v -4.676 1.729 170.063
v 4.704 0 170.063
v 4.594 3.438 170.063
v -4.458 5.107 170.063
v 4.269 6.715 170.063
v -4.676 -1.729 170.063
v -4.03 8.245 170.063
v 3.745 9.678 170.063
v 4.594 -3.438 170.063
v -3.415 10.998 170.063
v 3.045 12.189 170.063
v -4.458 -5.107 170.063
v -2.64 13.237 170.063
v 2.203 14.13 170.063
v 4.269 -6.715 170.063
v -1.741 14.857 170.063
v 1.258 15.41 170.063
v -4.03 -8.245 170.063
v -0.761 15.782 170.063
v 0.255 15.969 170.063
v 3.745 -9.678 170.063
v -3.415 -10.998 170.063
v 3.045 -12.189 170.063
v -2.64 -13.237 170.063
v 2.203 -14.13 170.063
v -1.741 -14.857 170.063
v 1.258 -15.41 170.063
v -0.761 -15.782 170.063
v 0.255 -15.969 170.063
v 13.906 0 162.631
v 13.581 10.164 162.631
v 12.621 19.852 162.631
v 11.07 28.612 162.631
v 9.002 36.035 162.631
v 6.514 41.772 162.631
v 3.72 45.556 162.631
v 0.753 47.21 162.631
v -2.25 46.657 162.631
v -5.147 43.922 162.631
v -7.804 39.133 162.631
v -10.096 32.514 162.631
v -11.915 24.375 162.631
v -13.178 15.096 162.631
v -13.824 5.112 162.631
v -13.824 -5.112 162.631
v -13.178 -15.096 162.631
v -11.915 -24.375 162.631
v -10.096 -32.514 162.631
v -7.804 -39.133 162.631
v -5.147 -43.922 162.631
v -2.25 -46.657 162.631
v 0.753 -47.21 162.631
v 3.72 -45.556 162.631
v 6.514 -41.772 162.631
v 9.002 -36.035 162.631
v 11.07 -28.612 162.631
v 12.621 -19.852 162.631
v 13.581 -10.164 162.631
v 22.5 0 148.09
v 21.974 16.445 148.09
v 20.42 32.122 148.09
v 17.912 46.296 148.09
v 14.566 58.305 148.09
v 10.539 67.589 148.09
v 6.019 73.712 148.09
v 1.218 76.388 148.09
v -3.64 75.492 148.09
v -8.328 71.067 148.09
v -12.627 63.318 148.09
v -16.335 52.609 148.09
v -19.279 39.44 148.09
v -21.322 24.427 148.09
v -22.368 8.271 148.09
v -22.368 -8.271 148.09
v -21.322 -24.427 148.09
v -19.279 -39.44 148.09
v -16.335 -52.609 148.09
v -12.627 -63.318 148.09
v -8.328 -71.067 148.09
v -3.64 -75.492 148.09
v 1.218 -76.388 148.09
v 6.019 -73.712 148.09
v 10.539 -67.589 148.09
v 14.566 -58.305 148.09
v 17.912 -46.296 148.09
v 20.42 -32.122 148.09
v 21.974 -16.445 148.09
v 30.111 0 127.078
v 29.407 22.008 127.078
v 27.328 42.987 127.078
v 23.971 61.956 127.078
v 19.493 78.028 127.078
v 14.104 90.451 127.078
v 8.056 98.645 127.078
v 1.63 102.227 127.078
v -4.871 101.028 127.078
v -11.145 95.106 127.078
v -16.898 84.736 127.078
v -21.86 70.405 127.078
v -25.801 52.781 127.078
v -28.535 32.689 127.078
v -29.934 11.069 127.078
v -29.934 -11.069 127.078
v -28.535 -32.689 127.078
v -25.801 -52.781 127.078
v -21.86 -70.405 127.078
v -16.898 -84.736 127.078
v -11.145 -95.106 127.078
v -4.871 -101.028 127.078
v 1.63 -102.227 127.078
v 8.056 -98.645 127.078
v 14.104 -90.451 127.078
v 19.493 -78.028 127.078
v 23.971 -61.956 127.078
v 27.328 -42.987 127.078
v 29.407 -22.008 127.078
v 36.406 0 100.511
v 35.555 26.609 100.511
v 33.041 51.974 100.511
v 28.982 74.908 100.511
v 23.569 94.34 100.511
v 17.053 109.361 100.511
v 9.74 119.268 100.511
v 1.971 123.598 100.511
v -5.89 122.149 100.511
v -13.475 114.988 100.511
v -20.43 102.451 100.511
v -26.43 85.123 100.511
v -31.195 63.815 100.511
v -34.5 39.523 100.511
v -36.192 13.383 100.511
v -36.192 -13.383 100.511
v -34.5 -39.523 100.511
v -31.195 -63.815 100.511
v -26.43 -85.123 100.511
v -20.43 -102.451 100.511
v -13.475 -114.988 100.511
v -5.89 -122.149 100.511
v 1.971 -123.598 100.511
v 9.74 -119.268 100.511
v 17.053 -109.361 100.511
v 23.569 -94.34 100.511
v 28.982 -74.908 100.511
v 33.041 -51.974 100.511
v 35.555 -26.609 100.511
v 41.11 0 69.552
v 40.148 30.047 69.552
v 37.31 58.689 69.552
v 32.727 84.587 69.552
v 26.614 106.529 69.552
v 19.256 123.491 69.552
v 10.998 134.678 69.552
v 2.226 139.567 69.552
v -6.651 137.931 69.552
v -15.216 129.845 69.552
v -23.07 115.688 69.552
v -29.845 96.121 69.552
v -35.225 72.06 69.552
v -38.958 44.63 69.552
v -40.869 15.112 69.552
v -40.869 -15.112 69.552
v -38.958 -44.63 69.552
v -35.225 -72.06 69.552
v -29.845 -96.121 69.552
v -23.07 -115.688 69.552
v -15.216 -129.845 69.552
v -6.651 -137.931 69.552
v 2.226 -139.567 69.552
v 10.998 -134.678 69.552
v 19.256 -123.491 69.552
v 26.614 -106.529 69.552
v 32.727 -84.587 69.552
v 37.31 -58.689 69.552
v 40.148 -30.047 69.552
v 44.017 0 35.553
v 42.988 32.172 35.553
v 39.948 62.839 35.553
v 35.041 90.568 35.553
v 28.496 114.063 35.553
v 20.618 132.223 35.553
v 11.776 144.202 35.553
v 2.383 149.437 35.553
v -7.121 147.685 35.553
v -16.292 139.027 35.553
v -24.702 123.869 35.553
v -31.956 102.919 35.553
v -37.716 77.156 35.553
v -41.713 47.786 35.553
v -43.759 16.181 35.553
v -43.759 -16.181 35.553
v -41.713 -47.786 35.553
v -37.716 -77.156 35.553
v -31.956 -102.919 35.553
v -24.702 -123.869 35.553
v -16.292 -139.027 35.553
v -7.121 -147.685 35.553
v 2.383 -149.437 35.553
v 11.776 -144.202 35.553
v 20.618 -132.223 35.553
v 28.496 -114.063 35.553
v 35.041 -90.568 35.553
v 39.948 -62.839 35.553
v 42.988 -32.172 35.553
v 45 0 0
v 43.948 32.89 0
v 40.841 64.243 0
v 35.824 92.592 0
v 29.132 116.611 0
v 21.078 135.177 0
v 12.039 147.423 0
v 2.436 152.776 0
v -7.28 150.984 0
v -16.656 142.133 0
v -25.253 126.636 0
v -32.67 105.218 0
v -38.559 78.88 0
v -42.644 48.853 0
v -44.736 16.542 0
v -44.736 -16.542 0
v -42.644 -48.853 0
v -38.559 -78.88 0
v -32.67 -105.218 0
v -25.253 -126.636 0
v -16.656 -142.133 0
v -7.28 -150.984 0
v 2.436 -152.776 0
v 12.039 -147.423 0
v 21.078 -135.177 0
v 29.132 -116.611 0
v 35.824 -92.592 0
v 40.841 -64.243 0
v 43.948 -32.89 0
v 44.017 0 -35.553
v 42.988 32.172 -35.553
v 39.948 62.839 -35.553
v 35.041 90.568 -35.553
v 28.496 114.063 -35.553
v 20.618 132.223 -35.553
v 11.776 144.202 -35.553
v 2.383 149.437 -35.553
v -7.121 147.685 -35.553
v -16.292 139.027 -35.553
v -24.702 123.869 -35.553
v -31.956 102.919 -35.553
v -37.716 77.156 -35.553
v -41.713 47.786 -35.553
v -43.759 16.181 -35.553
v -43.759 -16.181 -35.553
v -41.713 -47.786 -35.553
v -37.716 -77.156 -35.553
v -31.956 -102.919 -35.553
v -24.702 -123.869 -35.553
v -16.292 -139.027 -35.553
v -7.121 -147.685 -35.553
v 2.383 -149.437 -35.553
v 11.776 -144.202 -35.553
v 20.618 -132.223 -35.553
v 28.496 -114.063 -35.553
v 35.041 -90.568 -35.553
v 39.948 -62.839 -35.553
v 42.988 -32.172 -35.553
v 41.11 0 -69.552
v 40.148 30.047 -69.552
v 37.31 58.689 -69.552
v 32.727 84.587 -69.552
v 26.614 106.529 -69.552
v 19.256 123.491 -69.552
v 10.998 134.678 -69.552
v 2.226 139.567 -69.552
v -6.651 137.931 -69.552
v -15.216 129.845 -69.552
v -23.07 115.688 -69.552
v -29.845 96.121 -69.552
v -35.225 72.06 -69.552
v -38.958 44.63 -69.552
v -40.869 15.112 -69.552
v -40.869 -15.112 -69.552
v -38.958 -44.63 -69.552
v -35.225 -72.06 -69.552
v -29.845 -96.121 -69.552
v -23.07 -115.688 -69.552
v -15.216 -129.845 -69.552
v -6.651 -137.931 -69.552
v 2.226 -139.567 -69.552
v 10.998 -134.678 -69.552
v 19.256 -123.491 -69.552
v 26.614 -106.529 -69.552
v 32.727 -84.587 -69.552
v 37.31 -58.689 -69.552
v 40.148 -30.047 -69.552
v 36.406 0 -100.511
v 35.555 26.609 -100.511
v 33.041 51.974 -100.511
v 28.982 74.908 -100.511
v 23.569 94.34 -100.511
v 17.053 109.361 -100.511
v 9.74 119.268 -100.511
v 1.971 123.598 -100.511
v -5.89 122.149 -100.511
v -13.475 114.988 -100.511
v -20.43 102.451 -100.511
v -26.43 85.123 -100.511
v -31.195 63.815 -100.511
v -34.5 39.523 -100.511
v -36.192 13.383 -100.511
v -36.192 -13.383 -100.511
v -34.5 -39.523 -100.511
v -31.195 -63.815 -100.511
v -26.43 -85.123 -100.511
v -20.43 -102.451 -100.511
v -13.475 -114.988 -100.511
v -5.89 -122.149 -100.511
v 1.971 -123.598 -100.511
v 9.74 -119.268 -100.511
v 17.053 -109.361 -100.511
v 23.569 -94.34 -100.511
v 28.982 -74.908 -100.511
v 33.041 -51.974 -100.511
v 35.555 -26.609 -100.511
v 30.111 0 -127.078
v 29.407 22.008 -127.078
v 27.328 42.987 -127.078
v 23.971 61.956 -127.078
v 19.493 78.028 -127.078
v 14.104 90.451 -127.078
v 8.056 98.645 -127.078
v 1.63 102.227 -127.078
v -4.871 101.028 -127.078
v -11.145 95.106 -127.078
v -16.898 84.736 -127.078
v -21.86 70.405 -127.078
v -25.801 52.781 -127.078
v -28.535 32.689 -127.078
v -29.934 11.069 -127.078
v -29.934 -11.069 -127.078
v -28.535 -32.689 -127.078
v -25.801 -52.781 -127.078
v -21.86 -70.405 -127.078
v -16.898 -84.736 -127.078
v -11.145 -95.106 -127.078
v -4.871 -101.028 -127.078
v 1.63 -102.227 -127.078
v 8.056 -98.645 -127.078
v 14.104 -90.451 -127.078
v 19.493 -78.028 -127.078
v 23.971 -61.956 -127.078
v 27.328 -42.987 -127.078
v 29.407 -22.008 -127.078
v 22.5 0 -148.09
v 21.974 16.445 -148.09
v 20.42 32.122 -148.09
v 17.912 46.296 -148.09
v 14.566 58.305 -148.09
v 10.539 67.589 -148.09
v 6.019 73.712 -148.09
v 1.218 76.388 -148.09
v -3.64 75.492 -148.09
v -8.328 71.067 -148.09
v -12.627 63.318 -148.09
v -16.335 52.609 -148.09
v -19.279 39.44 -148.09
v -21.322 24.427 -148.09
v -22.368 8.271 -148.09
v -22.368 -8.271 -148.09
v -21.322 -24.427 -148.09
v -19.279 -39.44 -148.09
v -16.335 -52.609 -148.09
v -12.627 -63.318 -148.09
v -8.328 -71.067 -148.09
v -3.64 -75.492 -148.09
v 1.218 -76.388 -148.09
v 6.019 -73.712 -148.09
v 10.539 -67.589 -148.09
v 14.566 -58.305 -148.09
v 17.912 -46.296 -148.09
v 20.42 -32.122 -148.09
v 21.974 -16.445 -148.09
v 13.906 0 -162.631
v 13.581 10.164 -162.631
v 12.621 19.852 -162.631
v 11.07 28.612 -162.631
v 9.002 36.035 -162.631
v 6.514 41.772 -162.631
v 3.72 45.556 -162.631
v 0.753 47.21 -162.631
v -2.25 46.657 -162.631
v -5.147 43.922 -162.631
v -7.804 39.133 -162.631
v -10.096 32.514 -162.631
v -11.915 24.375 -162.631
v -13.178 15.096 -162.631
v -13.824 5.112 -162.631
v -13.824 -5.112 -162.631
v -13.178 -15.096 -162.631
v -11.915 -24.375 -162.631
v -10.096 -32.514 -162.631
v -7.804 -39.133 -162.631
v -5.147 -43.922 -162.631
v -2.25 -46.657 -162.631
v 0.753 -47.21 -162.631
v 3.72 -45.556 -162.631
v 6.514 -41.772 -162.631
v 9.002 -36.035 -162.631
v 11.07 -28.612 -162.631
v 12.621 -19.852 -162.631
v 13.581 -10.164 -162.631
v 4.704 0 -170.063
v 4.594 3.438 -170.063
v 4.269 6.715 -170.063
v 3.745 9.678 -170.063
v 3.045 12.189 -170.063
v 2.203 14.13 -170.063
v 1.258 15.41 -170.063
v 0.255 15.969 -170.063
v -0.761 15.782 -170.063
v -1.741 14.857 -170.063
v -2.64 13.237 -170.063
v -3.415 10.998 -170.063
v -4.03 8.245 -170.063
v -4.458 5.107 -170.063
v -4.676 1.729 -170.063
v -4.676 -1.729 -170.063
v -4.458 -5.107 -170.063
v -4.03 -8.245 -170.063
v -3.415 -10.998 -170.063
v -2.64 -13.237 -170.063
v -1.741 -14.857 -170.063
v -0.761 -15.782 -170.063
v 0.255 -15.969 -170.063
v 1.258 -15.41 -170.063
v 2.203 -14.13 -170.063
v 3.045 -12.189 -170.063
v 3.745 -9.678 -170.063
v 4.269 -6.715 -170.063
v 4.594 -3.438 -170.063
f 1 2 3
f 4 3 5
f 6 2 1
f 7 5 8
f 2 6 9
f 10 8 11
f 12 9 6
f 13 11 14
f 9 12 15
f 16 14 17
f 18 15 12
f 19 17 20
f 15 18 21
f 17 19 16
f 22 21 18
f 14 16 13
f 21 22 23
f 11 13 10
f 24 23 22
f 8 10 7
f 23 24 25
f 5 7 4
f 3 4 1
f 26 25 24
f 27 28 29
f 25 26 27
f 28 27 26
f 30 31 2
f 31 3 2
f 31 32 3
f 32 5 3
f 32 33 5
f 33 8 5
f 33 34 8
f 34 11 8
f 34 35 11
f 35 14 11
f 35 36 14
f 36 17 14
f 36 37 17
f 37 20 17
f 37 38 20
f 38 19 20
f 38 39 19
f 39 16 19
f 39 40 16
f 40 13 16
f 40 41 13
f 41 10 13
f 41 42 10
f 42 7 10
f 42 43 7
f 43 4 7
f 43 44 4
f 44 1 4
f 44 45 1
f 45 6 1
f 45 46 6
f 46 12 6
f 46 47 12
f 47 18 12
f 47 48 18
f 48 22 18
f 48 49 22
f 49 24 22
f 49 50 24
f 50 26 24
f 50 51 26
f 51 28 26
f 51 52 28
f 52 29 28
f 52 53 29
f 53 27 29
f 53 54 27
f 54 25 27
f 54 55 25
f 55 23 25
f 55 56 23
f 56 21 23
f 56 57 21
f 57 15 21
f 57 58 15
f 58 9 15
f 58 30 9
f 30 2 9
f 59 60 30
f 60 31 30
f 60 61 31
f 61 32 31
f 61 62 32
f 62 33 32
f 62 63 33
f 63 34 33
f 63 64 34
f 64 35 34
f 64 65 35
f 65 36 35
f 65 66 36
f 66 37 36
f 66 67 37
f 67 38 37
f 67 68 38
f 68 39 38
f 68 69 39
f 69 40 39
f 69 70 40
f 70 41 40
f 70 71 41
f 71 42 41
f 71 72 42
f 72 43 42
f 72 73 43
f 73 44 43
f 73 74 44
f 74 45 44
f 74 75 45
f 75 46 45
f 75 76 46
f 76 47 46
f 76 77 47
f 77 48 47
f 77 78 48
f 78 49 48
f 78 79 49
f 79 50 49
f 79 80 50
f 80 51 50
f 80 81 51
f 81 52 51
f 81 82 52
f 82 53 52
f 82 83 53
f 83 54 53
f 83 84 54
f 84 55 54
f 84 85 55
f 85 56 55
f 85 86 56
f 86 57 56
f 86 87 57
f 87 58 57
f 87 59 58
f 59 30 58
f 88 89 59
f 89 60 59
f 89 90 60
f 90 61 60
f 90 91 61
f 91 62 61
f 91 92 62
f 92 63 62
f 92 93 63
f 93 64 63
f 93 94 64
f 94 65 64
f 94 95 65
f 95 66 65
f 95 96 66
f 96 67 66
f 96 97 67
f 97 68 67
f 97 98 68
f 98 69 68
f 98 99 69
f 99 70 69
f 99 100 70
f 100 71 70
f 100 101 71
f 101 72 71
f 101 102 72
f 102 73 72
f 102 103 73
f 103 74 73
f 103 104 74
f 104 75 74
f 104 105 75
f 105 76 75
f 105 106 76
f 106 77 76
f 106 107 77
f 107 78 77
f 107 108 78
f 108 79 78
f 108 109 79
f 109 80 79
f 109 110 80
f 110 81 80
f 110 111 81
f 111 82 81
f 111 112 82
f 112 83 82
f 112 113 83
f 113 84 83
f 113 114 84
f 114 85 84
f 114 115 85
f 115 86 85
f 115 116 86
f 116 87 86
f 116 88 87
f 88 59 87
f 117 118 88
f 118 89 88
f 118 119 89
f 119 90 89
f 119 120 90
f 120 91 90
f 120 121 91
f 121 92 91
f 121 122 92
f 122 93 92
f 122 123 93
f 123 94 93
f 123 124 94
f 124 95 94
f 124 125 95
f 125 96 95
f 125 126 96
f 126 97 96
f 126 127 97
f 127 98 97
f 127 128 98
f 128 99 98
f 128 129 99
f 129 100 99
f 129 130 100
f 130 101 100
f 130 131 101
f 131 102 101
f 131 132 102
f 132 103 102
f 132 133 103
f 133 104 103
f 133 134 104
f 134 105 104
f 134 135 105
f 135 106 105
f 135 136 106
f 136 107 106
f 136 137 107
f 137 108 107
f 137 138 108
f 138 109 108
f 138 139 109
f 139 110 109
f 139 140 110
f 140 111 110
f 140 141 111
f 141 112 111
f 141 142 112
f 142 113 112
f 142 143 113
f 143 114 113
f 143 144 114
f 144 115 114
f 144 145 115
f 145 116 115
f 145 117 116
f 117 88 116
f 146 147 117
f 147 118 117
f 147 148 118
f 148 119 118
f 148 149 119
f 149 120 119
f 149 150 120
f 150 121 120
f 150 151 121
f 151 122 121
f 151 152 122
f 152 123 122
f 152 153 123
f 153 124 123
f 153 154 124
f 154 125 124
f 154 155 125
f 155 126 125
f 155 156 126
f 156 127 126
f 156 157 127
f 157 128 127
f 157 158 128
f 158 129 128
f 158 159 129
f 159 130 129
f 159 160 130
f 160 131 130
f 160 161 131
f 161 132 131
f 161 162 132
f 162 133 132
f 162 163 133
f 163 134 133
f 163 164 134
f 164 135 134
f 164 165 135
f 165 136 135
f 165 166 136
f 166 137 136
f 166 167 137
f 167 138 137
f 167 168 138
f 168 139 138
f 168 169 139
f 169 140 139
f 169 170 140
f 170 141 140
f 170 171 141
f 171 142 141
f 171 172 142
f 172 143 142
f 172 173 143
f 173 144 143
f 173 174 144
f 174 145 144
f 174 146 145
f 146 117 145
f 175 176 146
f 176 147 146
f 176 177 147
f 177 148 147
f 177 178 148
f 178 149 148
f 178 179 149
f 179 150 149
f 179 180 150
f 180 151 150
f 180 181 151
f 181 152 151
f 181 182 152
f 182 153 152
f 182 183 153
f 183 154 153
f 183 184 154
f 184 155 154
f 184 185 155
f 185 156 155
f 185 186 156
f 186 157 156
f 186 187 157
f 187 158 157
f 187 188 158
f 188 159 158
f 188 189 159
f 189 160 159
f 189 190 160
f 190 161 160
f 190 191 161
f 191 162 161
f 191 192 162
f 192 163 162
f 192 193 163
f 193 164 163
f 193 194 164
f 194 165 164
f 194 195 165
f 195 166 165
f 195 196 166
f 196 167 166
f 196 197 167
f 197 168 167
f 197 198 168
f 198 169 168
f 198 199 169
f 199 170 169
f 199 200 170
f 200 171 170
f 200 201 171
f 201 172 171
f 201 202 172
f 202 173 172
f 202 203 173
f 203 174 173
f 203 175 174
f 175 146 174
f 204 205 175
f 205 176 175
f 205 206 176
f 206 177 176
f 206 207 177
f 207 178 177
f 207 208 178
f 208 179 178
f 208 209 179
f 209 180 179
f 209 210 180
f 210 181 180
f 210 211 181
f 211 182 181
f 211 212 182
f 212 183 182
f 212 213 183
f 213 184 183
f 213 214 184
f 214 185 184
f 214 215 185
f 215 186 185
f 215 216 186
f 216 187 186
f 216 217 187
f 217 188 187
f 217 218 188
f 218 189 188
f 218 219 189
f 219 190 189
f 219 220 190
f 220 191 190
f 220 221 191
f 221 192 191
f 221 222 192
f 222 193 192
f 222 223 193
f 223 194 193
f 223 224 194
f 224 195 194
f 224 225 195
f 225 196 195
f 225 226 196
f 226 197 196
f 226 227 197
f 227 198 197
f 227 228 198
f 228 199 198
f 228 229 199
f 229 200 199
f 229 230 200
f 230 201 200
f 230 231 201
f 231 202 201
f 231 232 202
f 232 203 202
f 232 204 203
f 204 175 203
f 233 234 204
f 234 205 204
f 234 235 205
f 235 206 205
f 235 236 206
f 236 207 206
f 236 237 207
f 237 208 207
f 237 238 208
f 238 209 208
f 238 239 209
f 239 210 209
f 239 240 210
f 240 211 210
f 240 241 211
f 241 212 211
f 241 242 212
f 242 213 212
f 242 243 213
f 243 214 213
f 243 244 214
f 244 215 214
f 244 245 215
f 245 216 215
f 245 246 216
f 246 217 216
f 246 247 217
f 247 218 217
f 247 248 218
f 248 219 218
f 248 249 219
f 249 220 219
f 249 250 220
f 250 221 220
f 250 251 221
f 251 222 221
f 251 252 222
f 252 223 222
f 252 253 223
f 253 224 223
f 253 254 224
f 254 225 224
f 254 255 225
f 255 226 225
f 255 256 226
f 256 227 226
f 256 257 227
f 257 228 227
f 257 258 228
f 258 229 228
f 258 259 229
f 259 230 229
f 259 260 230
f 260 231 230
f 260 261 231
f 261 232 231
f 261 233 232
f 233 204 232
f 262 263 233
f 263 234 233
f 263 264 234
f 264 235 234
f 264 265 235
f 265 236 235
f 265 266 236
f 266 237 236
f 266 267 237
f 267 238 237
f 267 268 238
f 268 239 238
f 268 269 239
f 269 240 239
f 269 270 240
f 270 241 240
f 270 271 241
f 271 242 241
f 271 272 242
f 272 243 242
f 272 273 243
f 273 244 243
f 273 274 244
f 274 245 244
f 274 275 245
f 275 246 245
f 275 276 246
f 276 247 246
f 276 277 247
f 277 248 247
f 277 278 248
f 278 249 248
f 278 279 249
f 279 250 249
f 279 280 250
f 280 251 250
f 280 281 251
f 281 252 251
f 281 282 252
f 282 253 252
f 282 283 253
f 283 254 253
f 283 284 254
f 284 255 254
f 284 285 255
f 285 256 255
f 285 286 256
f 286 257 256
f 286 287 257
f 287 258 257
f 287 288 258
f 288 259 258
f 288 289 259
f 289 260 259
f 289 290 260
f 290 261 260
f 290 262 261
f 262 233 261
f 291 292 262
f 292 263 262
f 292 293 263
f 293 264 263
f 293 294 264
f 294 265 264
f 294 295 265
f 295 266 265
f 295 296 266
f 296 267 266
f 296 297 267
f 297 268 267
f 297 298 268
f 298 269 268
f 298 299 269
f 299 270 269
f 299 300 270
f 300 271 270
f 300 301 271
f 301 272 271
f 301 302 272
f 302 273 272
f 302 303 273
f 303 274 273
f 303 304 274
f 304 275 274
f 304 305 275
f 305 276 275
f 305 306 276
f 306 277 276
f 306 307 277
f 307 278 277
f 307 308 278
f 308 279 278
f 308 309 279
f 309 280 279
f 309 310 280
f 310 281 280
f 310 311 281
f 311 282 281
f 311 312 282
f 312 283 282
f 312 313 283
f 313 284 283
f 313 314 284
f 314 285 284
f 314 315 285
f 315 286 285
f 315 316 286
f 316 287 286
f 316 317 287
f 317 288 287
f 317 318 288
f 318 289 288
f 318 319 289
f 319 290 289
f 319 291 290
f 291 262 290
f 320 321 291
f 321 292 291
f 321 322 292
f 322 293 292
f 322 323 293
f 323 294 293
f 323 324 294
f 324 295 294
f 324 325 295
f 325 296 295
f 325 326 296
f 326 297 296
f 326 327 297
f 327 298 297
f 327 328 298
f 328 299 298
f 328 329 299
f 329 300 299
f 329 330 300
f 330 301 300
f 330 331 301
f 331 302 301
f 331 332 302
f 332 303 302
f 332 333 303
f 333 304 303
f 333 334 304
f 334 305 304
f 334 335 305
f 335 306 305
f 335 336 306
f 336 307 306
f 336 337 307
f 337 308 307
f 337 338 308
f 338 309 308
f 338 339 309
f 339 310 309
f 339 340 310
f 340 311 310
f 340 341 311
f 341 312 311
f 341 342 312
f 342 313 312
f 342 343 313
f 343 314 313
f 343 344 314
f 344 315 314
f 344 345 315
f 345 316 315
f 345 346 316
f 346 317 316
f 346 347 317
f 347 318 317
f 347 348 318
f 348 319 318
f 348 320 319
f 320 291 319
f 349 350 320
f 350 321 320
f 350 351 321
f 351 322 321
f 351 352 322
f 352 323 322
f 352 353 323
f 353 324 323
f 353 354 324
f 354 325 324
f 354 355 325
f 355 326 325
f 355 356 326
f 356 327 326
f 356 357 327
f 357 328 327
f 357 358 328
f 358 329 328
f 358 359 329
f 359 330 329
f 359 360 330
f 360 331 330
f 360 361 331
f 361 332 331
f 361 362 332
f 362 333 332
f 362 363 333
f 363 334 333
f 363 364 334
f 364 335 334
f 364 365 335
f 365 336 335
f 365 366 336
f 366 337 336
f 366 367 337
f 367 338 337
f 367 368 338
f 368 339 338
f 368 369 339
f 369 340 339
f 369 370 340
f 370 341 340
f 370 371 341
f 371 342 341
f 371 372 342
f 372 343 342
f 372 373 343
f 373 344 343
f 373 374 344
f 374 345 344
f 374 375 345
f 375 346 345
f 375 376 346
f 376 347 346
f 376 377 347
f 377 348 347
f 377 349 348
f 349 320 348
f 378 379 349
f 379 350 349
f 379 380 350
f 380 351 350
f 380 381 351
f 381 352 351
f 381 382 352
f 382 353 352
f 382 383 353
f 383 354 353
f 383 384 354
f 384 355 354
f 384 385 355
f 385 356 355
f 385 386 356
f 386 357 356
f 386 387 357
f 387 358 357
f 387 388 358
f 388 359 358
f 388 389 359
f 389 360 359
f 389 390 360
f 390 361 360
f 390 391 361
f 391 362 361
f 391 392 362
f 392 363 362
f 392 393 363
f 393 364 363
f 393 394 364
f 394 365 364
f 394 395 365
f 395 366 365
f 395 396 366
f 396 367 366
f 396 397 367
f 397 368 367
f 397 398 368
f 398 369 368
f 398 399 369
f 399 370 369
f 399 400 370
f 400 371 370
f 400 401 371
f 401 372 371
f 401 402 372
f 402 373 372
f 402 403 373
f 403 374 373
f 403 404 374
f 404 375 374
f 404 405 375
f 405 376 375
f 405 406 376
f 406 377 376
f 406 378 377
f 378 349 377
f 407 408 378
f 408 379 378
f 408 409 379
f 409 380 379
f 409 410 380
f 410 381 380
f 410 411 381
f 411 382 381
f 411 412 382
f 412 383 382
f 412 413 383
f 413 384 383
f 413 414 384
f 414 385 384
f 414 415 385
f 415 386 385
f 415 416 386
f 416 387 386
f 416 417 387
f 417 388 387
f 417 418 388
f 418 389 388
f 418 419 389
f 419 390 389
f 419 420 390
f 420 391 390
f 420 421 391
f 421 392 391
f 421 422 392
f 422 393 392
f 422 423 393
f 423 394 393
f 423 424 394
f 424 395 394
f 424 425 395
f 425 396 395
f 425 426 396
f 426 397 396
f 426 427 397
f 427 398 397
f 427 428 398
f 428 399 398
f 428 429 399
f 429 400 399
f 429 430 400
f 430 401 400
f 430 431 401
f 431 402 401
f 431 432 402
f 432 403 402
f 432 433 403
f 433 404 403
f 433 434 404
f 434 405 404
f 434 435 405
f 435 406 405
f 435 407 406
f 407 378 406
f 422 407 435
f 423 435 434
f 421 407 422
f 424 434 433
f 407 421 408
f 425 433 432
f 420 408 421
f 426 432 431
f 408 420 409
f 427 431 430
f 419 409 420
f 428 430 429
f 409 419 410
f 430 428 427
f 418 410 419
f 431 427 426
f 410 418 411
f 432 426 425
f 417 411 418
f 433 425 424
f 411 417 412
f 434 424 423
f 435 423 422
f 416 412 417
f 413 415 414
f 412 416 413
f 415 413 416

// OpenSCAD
// Generated by SolidPython 1.0.1 on 2020-07-29 00:46:47


scale(v = [5, 17, 19]) {
	sphere(r = 9);
}
/***********************************************
*********      SolidPython code:      **********
************************************************
 
# import packages: SolidPython
from solid import *
from solid.utils import *
from itertools import chain, combinations, permutations


class Resize:

    def __init__(self, scad_file):
        self.scad_file = scad_file
        #self.scad_file = import_scad(scad_file)
        # cone/cylinder param:
        self.r1 = 0
        self.r2 = 0
        self.h = 0
        # rectangular prism param:
        self.w = 0
        self.l = 0
        # ellipse param:
        self.r = 0

    # import OpenScad code (file name corresponds to shape)


    # classify shape + parameters
    def assign(self, param1, param2, param3):
        if self.scad_file == 'cone.scad':
            self.r1 = param1
            self.r2 = param2
            self.h = param3
        elif self.scad_file == 'cylinder.scad':
            self.r1 = param1
            self.r2 = param2
            self.h = param3
        elif self.scad_file == 'rectangularPrism.scad':
            self.h = param1
            self.l = param2
            self.w = param3
        else:
            self.r = param1
            self.h = param2

    # resize parameters
    def iterate(self):
        x = range(3, 20, 2)
        i = 1
        if self.scad_file == 'cone.scad':
            tempList = list(permutations(x, 2))
            for temp in tempList:
                param1 = temp[0]
                param2 = temp[1]
                filepath = 'produced_scad_files/' + 'cone' + str(param1) + '_' + str(param2) + '_' + '.scad'
                scad_render_to_file(cylinder(h=param1, r1=param2, r2=0), filepath)

        elif self.scad_file == 'cylinder.scad':
            tempList = list(permutations(x, 3))
            for temp in tempList:
                param1 = temp[0]
                param2 = temp[1]
                filepath = 'produced_scad_files/' + 'cylinder' + str(param1) + '_' + str(param2) + '_' + '.scad'
                scad_render_to_file(cylinder(h=param1, r1=param2, r2=param2), filepath)

        elif self.scad_file == 'rectangularPrism.scad':
            tempList = list(permutations(x, 3))
            for temp in tempList:
                param1 = temp[0]
                param2 = temp[1]
                param3 = temp[2]
                filepath = 'produced_scad_files/' + 'rectangularPrism' + str(param1) + '_' + str(param2) + '_' + str(
                    param3) + '.scad'
                scad_render_to_file(cube(size=(param1, param2, param3)), filepath)

        elif self.scad_file == 'ellipse.scad':
            tempList = list(permutations(x, 4))
            for temp in tempList:
                param1 = temp[0]
                param2 = temp[1]
                param3 = temp[2]
                param4 = temp[3]
                filepath = 'produced_scad_files/' + 'ellipse' + str(param1) + '_' + str(param2) + '_' + str(param3) + '_' + str(param4) + '.scad'
                scad_render_to_file(scale([param1, param2, param3])(sphere(r=param4)), filepath)

    def render_to_scadfile(self):
        scad_render_to_file(scad, 'example.scad') 
 
************************************************/
